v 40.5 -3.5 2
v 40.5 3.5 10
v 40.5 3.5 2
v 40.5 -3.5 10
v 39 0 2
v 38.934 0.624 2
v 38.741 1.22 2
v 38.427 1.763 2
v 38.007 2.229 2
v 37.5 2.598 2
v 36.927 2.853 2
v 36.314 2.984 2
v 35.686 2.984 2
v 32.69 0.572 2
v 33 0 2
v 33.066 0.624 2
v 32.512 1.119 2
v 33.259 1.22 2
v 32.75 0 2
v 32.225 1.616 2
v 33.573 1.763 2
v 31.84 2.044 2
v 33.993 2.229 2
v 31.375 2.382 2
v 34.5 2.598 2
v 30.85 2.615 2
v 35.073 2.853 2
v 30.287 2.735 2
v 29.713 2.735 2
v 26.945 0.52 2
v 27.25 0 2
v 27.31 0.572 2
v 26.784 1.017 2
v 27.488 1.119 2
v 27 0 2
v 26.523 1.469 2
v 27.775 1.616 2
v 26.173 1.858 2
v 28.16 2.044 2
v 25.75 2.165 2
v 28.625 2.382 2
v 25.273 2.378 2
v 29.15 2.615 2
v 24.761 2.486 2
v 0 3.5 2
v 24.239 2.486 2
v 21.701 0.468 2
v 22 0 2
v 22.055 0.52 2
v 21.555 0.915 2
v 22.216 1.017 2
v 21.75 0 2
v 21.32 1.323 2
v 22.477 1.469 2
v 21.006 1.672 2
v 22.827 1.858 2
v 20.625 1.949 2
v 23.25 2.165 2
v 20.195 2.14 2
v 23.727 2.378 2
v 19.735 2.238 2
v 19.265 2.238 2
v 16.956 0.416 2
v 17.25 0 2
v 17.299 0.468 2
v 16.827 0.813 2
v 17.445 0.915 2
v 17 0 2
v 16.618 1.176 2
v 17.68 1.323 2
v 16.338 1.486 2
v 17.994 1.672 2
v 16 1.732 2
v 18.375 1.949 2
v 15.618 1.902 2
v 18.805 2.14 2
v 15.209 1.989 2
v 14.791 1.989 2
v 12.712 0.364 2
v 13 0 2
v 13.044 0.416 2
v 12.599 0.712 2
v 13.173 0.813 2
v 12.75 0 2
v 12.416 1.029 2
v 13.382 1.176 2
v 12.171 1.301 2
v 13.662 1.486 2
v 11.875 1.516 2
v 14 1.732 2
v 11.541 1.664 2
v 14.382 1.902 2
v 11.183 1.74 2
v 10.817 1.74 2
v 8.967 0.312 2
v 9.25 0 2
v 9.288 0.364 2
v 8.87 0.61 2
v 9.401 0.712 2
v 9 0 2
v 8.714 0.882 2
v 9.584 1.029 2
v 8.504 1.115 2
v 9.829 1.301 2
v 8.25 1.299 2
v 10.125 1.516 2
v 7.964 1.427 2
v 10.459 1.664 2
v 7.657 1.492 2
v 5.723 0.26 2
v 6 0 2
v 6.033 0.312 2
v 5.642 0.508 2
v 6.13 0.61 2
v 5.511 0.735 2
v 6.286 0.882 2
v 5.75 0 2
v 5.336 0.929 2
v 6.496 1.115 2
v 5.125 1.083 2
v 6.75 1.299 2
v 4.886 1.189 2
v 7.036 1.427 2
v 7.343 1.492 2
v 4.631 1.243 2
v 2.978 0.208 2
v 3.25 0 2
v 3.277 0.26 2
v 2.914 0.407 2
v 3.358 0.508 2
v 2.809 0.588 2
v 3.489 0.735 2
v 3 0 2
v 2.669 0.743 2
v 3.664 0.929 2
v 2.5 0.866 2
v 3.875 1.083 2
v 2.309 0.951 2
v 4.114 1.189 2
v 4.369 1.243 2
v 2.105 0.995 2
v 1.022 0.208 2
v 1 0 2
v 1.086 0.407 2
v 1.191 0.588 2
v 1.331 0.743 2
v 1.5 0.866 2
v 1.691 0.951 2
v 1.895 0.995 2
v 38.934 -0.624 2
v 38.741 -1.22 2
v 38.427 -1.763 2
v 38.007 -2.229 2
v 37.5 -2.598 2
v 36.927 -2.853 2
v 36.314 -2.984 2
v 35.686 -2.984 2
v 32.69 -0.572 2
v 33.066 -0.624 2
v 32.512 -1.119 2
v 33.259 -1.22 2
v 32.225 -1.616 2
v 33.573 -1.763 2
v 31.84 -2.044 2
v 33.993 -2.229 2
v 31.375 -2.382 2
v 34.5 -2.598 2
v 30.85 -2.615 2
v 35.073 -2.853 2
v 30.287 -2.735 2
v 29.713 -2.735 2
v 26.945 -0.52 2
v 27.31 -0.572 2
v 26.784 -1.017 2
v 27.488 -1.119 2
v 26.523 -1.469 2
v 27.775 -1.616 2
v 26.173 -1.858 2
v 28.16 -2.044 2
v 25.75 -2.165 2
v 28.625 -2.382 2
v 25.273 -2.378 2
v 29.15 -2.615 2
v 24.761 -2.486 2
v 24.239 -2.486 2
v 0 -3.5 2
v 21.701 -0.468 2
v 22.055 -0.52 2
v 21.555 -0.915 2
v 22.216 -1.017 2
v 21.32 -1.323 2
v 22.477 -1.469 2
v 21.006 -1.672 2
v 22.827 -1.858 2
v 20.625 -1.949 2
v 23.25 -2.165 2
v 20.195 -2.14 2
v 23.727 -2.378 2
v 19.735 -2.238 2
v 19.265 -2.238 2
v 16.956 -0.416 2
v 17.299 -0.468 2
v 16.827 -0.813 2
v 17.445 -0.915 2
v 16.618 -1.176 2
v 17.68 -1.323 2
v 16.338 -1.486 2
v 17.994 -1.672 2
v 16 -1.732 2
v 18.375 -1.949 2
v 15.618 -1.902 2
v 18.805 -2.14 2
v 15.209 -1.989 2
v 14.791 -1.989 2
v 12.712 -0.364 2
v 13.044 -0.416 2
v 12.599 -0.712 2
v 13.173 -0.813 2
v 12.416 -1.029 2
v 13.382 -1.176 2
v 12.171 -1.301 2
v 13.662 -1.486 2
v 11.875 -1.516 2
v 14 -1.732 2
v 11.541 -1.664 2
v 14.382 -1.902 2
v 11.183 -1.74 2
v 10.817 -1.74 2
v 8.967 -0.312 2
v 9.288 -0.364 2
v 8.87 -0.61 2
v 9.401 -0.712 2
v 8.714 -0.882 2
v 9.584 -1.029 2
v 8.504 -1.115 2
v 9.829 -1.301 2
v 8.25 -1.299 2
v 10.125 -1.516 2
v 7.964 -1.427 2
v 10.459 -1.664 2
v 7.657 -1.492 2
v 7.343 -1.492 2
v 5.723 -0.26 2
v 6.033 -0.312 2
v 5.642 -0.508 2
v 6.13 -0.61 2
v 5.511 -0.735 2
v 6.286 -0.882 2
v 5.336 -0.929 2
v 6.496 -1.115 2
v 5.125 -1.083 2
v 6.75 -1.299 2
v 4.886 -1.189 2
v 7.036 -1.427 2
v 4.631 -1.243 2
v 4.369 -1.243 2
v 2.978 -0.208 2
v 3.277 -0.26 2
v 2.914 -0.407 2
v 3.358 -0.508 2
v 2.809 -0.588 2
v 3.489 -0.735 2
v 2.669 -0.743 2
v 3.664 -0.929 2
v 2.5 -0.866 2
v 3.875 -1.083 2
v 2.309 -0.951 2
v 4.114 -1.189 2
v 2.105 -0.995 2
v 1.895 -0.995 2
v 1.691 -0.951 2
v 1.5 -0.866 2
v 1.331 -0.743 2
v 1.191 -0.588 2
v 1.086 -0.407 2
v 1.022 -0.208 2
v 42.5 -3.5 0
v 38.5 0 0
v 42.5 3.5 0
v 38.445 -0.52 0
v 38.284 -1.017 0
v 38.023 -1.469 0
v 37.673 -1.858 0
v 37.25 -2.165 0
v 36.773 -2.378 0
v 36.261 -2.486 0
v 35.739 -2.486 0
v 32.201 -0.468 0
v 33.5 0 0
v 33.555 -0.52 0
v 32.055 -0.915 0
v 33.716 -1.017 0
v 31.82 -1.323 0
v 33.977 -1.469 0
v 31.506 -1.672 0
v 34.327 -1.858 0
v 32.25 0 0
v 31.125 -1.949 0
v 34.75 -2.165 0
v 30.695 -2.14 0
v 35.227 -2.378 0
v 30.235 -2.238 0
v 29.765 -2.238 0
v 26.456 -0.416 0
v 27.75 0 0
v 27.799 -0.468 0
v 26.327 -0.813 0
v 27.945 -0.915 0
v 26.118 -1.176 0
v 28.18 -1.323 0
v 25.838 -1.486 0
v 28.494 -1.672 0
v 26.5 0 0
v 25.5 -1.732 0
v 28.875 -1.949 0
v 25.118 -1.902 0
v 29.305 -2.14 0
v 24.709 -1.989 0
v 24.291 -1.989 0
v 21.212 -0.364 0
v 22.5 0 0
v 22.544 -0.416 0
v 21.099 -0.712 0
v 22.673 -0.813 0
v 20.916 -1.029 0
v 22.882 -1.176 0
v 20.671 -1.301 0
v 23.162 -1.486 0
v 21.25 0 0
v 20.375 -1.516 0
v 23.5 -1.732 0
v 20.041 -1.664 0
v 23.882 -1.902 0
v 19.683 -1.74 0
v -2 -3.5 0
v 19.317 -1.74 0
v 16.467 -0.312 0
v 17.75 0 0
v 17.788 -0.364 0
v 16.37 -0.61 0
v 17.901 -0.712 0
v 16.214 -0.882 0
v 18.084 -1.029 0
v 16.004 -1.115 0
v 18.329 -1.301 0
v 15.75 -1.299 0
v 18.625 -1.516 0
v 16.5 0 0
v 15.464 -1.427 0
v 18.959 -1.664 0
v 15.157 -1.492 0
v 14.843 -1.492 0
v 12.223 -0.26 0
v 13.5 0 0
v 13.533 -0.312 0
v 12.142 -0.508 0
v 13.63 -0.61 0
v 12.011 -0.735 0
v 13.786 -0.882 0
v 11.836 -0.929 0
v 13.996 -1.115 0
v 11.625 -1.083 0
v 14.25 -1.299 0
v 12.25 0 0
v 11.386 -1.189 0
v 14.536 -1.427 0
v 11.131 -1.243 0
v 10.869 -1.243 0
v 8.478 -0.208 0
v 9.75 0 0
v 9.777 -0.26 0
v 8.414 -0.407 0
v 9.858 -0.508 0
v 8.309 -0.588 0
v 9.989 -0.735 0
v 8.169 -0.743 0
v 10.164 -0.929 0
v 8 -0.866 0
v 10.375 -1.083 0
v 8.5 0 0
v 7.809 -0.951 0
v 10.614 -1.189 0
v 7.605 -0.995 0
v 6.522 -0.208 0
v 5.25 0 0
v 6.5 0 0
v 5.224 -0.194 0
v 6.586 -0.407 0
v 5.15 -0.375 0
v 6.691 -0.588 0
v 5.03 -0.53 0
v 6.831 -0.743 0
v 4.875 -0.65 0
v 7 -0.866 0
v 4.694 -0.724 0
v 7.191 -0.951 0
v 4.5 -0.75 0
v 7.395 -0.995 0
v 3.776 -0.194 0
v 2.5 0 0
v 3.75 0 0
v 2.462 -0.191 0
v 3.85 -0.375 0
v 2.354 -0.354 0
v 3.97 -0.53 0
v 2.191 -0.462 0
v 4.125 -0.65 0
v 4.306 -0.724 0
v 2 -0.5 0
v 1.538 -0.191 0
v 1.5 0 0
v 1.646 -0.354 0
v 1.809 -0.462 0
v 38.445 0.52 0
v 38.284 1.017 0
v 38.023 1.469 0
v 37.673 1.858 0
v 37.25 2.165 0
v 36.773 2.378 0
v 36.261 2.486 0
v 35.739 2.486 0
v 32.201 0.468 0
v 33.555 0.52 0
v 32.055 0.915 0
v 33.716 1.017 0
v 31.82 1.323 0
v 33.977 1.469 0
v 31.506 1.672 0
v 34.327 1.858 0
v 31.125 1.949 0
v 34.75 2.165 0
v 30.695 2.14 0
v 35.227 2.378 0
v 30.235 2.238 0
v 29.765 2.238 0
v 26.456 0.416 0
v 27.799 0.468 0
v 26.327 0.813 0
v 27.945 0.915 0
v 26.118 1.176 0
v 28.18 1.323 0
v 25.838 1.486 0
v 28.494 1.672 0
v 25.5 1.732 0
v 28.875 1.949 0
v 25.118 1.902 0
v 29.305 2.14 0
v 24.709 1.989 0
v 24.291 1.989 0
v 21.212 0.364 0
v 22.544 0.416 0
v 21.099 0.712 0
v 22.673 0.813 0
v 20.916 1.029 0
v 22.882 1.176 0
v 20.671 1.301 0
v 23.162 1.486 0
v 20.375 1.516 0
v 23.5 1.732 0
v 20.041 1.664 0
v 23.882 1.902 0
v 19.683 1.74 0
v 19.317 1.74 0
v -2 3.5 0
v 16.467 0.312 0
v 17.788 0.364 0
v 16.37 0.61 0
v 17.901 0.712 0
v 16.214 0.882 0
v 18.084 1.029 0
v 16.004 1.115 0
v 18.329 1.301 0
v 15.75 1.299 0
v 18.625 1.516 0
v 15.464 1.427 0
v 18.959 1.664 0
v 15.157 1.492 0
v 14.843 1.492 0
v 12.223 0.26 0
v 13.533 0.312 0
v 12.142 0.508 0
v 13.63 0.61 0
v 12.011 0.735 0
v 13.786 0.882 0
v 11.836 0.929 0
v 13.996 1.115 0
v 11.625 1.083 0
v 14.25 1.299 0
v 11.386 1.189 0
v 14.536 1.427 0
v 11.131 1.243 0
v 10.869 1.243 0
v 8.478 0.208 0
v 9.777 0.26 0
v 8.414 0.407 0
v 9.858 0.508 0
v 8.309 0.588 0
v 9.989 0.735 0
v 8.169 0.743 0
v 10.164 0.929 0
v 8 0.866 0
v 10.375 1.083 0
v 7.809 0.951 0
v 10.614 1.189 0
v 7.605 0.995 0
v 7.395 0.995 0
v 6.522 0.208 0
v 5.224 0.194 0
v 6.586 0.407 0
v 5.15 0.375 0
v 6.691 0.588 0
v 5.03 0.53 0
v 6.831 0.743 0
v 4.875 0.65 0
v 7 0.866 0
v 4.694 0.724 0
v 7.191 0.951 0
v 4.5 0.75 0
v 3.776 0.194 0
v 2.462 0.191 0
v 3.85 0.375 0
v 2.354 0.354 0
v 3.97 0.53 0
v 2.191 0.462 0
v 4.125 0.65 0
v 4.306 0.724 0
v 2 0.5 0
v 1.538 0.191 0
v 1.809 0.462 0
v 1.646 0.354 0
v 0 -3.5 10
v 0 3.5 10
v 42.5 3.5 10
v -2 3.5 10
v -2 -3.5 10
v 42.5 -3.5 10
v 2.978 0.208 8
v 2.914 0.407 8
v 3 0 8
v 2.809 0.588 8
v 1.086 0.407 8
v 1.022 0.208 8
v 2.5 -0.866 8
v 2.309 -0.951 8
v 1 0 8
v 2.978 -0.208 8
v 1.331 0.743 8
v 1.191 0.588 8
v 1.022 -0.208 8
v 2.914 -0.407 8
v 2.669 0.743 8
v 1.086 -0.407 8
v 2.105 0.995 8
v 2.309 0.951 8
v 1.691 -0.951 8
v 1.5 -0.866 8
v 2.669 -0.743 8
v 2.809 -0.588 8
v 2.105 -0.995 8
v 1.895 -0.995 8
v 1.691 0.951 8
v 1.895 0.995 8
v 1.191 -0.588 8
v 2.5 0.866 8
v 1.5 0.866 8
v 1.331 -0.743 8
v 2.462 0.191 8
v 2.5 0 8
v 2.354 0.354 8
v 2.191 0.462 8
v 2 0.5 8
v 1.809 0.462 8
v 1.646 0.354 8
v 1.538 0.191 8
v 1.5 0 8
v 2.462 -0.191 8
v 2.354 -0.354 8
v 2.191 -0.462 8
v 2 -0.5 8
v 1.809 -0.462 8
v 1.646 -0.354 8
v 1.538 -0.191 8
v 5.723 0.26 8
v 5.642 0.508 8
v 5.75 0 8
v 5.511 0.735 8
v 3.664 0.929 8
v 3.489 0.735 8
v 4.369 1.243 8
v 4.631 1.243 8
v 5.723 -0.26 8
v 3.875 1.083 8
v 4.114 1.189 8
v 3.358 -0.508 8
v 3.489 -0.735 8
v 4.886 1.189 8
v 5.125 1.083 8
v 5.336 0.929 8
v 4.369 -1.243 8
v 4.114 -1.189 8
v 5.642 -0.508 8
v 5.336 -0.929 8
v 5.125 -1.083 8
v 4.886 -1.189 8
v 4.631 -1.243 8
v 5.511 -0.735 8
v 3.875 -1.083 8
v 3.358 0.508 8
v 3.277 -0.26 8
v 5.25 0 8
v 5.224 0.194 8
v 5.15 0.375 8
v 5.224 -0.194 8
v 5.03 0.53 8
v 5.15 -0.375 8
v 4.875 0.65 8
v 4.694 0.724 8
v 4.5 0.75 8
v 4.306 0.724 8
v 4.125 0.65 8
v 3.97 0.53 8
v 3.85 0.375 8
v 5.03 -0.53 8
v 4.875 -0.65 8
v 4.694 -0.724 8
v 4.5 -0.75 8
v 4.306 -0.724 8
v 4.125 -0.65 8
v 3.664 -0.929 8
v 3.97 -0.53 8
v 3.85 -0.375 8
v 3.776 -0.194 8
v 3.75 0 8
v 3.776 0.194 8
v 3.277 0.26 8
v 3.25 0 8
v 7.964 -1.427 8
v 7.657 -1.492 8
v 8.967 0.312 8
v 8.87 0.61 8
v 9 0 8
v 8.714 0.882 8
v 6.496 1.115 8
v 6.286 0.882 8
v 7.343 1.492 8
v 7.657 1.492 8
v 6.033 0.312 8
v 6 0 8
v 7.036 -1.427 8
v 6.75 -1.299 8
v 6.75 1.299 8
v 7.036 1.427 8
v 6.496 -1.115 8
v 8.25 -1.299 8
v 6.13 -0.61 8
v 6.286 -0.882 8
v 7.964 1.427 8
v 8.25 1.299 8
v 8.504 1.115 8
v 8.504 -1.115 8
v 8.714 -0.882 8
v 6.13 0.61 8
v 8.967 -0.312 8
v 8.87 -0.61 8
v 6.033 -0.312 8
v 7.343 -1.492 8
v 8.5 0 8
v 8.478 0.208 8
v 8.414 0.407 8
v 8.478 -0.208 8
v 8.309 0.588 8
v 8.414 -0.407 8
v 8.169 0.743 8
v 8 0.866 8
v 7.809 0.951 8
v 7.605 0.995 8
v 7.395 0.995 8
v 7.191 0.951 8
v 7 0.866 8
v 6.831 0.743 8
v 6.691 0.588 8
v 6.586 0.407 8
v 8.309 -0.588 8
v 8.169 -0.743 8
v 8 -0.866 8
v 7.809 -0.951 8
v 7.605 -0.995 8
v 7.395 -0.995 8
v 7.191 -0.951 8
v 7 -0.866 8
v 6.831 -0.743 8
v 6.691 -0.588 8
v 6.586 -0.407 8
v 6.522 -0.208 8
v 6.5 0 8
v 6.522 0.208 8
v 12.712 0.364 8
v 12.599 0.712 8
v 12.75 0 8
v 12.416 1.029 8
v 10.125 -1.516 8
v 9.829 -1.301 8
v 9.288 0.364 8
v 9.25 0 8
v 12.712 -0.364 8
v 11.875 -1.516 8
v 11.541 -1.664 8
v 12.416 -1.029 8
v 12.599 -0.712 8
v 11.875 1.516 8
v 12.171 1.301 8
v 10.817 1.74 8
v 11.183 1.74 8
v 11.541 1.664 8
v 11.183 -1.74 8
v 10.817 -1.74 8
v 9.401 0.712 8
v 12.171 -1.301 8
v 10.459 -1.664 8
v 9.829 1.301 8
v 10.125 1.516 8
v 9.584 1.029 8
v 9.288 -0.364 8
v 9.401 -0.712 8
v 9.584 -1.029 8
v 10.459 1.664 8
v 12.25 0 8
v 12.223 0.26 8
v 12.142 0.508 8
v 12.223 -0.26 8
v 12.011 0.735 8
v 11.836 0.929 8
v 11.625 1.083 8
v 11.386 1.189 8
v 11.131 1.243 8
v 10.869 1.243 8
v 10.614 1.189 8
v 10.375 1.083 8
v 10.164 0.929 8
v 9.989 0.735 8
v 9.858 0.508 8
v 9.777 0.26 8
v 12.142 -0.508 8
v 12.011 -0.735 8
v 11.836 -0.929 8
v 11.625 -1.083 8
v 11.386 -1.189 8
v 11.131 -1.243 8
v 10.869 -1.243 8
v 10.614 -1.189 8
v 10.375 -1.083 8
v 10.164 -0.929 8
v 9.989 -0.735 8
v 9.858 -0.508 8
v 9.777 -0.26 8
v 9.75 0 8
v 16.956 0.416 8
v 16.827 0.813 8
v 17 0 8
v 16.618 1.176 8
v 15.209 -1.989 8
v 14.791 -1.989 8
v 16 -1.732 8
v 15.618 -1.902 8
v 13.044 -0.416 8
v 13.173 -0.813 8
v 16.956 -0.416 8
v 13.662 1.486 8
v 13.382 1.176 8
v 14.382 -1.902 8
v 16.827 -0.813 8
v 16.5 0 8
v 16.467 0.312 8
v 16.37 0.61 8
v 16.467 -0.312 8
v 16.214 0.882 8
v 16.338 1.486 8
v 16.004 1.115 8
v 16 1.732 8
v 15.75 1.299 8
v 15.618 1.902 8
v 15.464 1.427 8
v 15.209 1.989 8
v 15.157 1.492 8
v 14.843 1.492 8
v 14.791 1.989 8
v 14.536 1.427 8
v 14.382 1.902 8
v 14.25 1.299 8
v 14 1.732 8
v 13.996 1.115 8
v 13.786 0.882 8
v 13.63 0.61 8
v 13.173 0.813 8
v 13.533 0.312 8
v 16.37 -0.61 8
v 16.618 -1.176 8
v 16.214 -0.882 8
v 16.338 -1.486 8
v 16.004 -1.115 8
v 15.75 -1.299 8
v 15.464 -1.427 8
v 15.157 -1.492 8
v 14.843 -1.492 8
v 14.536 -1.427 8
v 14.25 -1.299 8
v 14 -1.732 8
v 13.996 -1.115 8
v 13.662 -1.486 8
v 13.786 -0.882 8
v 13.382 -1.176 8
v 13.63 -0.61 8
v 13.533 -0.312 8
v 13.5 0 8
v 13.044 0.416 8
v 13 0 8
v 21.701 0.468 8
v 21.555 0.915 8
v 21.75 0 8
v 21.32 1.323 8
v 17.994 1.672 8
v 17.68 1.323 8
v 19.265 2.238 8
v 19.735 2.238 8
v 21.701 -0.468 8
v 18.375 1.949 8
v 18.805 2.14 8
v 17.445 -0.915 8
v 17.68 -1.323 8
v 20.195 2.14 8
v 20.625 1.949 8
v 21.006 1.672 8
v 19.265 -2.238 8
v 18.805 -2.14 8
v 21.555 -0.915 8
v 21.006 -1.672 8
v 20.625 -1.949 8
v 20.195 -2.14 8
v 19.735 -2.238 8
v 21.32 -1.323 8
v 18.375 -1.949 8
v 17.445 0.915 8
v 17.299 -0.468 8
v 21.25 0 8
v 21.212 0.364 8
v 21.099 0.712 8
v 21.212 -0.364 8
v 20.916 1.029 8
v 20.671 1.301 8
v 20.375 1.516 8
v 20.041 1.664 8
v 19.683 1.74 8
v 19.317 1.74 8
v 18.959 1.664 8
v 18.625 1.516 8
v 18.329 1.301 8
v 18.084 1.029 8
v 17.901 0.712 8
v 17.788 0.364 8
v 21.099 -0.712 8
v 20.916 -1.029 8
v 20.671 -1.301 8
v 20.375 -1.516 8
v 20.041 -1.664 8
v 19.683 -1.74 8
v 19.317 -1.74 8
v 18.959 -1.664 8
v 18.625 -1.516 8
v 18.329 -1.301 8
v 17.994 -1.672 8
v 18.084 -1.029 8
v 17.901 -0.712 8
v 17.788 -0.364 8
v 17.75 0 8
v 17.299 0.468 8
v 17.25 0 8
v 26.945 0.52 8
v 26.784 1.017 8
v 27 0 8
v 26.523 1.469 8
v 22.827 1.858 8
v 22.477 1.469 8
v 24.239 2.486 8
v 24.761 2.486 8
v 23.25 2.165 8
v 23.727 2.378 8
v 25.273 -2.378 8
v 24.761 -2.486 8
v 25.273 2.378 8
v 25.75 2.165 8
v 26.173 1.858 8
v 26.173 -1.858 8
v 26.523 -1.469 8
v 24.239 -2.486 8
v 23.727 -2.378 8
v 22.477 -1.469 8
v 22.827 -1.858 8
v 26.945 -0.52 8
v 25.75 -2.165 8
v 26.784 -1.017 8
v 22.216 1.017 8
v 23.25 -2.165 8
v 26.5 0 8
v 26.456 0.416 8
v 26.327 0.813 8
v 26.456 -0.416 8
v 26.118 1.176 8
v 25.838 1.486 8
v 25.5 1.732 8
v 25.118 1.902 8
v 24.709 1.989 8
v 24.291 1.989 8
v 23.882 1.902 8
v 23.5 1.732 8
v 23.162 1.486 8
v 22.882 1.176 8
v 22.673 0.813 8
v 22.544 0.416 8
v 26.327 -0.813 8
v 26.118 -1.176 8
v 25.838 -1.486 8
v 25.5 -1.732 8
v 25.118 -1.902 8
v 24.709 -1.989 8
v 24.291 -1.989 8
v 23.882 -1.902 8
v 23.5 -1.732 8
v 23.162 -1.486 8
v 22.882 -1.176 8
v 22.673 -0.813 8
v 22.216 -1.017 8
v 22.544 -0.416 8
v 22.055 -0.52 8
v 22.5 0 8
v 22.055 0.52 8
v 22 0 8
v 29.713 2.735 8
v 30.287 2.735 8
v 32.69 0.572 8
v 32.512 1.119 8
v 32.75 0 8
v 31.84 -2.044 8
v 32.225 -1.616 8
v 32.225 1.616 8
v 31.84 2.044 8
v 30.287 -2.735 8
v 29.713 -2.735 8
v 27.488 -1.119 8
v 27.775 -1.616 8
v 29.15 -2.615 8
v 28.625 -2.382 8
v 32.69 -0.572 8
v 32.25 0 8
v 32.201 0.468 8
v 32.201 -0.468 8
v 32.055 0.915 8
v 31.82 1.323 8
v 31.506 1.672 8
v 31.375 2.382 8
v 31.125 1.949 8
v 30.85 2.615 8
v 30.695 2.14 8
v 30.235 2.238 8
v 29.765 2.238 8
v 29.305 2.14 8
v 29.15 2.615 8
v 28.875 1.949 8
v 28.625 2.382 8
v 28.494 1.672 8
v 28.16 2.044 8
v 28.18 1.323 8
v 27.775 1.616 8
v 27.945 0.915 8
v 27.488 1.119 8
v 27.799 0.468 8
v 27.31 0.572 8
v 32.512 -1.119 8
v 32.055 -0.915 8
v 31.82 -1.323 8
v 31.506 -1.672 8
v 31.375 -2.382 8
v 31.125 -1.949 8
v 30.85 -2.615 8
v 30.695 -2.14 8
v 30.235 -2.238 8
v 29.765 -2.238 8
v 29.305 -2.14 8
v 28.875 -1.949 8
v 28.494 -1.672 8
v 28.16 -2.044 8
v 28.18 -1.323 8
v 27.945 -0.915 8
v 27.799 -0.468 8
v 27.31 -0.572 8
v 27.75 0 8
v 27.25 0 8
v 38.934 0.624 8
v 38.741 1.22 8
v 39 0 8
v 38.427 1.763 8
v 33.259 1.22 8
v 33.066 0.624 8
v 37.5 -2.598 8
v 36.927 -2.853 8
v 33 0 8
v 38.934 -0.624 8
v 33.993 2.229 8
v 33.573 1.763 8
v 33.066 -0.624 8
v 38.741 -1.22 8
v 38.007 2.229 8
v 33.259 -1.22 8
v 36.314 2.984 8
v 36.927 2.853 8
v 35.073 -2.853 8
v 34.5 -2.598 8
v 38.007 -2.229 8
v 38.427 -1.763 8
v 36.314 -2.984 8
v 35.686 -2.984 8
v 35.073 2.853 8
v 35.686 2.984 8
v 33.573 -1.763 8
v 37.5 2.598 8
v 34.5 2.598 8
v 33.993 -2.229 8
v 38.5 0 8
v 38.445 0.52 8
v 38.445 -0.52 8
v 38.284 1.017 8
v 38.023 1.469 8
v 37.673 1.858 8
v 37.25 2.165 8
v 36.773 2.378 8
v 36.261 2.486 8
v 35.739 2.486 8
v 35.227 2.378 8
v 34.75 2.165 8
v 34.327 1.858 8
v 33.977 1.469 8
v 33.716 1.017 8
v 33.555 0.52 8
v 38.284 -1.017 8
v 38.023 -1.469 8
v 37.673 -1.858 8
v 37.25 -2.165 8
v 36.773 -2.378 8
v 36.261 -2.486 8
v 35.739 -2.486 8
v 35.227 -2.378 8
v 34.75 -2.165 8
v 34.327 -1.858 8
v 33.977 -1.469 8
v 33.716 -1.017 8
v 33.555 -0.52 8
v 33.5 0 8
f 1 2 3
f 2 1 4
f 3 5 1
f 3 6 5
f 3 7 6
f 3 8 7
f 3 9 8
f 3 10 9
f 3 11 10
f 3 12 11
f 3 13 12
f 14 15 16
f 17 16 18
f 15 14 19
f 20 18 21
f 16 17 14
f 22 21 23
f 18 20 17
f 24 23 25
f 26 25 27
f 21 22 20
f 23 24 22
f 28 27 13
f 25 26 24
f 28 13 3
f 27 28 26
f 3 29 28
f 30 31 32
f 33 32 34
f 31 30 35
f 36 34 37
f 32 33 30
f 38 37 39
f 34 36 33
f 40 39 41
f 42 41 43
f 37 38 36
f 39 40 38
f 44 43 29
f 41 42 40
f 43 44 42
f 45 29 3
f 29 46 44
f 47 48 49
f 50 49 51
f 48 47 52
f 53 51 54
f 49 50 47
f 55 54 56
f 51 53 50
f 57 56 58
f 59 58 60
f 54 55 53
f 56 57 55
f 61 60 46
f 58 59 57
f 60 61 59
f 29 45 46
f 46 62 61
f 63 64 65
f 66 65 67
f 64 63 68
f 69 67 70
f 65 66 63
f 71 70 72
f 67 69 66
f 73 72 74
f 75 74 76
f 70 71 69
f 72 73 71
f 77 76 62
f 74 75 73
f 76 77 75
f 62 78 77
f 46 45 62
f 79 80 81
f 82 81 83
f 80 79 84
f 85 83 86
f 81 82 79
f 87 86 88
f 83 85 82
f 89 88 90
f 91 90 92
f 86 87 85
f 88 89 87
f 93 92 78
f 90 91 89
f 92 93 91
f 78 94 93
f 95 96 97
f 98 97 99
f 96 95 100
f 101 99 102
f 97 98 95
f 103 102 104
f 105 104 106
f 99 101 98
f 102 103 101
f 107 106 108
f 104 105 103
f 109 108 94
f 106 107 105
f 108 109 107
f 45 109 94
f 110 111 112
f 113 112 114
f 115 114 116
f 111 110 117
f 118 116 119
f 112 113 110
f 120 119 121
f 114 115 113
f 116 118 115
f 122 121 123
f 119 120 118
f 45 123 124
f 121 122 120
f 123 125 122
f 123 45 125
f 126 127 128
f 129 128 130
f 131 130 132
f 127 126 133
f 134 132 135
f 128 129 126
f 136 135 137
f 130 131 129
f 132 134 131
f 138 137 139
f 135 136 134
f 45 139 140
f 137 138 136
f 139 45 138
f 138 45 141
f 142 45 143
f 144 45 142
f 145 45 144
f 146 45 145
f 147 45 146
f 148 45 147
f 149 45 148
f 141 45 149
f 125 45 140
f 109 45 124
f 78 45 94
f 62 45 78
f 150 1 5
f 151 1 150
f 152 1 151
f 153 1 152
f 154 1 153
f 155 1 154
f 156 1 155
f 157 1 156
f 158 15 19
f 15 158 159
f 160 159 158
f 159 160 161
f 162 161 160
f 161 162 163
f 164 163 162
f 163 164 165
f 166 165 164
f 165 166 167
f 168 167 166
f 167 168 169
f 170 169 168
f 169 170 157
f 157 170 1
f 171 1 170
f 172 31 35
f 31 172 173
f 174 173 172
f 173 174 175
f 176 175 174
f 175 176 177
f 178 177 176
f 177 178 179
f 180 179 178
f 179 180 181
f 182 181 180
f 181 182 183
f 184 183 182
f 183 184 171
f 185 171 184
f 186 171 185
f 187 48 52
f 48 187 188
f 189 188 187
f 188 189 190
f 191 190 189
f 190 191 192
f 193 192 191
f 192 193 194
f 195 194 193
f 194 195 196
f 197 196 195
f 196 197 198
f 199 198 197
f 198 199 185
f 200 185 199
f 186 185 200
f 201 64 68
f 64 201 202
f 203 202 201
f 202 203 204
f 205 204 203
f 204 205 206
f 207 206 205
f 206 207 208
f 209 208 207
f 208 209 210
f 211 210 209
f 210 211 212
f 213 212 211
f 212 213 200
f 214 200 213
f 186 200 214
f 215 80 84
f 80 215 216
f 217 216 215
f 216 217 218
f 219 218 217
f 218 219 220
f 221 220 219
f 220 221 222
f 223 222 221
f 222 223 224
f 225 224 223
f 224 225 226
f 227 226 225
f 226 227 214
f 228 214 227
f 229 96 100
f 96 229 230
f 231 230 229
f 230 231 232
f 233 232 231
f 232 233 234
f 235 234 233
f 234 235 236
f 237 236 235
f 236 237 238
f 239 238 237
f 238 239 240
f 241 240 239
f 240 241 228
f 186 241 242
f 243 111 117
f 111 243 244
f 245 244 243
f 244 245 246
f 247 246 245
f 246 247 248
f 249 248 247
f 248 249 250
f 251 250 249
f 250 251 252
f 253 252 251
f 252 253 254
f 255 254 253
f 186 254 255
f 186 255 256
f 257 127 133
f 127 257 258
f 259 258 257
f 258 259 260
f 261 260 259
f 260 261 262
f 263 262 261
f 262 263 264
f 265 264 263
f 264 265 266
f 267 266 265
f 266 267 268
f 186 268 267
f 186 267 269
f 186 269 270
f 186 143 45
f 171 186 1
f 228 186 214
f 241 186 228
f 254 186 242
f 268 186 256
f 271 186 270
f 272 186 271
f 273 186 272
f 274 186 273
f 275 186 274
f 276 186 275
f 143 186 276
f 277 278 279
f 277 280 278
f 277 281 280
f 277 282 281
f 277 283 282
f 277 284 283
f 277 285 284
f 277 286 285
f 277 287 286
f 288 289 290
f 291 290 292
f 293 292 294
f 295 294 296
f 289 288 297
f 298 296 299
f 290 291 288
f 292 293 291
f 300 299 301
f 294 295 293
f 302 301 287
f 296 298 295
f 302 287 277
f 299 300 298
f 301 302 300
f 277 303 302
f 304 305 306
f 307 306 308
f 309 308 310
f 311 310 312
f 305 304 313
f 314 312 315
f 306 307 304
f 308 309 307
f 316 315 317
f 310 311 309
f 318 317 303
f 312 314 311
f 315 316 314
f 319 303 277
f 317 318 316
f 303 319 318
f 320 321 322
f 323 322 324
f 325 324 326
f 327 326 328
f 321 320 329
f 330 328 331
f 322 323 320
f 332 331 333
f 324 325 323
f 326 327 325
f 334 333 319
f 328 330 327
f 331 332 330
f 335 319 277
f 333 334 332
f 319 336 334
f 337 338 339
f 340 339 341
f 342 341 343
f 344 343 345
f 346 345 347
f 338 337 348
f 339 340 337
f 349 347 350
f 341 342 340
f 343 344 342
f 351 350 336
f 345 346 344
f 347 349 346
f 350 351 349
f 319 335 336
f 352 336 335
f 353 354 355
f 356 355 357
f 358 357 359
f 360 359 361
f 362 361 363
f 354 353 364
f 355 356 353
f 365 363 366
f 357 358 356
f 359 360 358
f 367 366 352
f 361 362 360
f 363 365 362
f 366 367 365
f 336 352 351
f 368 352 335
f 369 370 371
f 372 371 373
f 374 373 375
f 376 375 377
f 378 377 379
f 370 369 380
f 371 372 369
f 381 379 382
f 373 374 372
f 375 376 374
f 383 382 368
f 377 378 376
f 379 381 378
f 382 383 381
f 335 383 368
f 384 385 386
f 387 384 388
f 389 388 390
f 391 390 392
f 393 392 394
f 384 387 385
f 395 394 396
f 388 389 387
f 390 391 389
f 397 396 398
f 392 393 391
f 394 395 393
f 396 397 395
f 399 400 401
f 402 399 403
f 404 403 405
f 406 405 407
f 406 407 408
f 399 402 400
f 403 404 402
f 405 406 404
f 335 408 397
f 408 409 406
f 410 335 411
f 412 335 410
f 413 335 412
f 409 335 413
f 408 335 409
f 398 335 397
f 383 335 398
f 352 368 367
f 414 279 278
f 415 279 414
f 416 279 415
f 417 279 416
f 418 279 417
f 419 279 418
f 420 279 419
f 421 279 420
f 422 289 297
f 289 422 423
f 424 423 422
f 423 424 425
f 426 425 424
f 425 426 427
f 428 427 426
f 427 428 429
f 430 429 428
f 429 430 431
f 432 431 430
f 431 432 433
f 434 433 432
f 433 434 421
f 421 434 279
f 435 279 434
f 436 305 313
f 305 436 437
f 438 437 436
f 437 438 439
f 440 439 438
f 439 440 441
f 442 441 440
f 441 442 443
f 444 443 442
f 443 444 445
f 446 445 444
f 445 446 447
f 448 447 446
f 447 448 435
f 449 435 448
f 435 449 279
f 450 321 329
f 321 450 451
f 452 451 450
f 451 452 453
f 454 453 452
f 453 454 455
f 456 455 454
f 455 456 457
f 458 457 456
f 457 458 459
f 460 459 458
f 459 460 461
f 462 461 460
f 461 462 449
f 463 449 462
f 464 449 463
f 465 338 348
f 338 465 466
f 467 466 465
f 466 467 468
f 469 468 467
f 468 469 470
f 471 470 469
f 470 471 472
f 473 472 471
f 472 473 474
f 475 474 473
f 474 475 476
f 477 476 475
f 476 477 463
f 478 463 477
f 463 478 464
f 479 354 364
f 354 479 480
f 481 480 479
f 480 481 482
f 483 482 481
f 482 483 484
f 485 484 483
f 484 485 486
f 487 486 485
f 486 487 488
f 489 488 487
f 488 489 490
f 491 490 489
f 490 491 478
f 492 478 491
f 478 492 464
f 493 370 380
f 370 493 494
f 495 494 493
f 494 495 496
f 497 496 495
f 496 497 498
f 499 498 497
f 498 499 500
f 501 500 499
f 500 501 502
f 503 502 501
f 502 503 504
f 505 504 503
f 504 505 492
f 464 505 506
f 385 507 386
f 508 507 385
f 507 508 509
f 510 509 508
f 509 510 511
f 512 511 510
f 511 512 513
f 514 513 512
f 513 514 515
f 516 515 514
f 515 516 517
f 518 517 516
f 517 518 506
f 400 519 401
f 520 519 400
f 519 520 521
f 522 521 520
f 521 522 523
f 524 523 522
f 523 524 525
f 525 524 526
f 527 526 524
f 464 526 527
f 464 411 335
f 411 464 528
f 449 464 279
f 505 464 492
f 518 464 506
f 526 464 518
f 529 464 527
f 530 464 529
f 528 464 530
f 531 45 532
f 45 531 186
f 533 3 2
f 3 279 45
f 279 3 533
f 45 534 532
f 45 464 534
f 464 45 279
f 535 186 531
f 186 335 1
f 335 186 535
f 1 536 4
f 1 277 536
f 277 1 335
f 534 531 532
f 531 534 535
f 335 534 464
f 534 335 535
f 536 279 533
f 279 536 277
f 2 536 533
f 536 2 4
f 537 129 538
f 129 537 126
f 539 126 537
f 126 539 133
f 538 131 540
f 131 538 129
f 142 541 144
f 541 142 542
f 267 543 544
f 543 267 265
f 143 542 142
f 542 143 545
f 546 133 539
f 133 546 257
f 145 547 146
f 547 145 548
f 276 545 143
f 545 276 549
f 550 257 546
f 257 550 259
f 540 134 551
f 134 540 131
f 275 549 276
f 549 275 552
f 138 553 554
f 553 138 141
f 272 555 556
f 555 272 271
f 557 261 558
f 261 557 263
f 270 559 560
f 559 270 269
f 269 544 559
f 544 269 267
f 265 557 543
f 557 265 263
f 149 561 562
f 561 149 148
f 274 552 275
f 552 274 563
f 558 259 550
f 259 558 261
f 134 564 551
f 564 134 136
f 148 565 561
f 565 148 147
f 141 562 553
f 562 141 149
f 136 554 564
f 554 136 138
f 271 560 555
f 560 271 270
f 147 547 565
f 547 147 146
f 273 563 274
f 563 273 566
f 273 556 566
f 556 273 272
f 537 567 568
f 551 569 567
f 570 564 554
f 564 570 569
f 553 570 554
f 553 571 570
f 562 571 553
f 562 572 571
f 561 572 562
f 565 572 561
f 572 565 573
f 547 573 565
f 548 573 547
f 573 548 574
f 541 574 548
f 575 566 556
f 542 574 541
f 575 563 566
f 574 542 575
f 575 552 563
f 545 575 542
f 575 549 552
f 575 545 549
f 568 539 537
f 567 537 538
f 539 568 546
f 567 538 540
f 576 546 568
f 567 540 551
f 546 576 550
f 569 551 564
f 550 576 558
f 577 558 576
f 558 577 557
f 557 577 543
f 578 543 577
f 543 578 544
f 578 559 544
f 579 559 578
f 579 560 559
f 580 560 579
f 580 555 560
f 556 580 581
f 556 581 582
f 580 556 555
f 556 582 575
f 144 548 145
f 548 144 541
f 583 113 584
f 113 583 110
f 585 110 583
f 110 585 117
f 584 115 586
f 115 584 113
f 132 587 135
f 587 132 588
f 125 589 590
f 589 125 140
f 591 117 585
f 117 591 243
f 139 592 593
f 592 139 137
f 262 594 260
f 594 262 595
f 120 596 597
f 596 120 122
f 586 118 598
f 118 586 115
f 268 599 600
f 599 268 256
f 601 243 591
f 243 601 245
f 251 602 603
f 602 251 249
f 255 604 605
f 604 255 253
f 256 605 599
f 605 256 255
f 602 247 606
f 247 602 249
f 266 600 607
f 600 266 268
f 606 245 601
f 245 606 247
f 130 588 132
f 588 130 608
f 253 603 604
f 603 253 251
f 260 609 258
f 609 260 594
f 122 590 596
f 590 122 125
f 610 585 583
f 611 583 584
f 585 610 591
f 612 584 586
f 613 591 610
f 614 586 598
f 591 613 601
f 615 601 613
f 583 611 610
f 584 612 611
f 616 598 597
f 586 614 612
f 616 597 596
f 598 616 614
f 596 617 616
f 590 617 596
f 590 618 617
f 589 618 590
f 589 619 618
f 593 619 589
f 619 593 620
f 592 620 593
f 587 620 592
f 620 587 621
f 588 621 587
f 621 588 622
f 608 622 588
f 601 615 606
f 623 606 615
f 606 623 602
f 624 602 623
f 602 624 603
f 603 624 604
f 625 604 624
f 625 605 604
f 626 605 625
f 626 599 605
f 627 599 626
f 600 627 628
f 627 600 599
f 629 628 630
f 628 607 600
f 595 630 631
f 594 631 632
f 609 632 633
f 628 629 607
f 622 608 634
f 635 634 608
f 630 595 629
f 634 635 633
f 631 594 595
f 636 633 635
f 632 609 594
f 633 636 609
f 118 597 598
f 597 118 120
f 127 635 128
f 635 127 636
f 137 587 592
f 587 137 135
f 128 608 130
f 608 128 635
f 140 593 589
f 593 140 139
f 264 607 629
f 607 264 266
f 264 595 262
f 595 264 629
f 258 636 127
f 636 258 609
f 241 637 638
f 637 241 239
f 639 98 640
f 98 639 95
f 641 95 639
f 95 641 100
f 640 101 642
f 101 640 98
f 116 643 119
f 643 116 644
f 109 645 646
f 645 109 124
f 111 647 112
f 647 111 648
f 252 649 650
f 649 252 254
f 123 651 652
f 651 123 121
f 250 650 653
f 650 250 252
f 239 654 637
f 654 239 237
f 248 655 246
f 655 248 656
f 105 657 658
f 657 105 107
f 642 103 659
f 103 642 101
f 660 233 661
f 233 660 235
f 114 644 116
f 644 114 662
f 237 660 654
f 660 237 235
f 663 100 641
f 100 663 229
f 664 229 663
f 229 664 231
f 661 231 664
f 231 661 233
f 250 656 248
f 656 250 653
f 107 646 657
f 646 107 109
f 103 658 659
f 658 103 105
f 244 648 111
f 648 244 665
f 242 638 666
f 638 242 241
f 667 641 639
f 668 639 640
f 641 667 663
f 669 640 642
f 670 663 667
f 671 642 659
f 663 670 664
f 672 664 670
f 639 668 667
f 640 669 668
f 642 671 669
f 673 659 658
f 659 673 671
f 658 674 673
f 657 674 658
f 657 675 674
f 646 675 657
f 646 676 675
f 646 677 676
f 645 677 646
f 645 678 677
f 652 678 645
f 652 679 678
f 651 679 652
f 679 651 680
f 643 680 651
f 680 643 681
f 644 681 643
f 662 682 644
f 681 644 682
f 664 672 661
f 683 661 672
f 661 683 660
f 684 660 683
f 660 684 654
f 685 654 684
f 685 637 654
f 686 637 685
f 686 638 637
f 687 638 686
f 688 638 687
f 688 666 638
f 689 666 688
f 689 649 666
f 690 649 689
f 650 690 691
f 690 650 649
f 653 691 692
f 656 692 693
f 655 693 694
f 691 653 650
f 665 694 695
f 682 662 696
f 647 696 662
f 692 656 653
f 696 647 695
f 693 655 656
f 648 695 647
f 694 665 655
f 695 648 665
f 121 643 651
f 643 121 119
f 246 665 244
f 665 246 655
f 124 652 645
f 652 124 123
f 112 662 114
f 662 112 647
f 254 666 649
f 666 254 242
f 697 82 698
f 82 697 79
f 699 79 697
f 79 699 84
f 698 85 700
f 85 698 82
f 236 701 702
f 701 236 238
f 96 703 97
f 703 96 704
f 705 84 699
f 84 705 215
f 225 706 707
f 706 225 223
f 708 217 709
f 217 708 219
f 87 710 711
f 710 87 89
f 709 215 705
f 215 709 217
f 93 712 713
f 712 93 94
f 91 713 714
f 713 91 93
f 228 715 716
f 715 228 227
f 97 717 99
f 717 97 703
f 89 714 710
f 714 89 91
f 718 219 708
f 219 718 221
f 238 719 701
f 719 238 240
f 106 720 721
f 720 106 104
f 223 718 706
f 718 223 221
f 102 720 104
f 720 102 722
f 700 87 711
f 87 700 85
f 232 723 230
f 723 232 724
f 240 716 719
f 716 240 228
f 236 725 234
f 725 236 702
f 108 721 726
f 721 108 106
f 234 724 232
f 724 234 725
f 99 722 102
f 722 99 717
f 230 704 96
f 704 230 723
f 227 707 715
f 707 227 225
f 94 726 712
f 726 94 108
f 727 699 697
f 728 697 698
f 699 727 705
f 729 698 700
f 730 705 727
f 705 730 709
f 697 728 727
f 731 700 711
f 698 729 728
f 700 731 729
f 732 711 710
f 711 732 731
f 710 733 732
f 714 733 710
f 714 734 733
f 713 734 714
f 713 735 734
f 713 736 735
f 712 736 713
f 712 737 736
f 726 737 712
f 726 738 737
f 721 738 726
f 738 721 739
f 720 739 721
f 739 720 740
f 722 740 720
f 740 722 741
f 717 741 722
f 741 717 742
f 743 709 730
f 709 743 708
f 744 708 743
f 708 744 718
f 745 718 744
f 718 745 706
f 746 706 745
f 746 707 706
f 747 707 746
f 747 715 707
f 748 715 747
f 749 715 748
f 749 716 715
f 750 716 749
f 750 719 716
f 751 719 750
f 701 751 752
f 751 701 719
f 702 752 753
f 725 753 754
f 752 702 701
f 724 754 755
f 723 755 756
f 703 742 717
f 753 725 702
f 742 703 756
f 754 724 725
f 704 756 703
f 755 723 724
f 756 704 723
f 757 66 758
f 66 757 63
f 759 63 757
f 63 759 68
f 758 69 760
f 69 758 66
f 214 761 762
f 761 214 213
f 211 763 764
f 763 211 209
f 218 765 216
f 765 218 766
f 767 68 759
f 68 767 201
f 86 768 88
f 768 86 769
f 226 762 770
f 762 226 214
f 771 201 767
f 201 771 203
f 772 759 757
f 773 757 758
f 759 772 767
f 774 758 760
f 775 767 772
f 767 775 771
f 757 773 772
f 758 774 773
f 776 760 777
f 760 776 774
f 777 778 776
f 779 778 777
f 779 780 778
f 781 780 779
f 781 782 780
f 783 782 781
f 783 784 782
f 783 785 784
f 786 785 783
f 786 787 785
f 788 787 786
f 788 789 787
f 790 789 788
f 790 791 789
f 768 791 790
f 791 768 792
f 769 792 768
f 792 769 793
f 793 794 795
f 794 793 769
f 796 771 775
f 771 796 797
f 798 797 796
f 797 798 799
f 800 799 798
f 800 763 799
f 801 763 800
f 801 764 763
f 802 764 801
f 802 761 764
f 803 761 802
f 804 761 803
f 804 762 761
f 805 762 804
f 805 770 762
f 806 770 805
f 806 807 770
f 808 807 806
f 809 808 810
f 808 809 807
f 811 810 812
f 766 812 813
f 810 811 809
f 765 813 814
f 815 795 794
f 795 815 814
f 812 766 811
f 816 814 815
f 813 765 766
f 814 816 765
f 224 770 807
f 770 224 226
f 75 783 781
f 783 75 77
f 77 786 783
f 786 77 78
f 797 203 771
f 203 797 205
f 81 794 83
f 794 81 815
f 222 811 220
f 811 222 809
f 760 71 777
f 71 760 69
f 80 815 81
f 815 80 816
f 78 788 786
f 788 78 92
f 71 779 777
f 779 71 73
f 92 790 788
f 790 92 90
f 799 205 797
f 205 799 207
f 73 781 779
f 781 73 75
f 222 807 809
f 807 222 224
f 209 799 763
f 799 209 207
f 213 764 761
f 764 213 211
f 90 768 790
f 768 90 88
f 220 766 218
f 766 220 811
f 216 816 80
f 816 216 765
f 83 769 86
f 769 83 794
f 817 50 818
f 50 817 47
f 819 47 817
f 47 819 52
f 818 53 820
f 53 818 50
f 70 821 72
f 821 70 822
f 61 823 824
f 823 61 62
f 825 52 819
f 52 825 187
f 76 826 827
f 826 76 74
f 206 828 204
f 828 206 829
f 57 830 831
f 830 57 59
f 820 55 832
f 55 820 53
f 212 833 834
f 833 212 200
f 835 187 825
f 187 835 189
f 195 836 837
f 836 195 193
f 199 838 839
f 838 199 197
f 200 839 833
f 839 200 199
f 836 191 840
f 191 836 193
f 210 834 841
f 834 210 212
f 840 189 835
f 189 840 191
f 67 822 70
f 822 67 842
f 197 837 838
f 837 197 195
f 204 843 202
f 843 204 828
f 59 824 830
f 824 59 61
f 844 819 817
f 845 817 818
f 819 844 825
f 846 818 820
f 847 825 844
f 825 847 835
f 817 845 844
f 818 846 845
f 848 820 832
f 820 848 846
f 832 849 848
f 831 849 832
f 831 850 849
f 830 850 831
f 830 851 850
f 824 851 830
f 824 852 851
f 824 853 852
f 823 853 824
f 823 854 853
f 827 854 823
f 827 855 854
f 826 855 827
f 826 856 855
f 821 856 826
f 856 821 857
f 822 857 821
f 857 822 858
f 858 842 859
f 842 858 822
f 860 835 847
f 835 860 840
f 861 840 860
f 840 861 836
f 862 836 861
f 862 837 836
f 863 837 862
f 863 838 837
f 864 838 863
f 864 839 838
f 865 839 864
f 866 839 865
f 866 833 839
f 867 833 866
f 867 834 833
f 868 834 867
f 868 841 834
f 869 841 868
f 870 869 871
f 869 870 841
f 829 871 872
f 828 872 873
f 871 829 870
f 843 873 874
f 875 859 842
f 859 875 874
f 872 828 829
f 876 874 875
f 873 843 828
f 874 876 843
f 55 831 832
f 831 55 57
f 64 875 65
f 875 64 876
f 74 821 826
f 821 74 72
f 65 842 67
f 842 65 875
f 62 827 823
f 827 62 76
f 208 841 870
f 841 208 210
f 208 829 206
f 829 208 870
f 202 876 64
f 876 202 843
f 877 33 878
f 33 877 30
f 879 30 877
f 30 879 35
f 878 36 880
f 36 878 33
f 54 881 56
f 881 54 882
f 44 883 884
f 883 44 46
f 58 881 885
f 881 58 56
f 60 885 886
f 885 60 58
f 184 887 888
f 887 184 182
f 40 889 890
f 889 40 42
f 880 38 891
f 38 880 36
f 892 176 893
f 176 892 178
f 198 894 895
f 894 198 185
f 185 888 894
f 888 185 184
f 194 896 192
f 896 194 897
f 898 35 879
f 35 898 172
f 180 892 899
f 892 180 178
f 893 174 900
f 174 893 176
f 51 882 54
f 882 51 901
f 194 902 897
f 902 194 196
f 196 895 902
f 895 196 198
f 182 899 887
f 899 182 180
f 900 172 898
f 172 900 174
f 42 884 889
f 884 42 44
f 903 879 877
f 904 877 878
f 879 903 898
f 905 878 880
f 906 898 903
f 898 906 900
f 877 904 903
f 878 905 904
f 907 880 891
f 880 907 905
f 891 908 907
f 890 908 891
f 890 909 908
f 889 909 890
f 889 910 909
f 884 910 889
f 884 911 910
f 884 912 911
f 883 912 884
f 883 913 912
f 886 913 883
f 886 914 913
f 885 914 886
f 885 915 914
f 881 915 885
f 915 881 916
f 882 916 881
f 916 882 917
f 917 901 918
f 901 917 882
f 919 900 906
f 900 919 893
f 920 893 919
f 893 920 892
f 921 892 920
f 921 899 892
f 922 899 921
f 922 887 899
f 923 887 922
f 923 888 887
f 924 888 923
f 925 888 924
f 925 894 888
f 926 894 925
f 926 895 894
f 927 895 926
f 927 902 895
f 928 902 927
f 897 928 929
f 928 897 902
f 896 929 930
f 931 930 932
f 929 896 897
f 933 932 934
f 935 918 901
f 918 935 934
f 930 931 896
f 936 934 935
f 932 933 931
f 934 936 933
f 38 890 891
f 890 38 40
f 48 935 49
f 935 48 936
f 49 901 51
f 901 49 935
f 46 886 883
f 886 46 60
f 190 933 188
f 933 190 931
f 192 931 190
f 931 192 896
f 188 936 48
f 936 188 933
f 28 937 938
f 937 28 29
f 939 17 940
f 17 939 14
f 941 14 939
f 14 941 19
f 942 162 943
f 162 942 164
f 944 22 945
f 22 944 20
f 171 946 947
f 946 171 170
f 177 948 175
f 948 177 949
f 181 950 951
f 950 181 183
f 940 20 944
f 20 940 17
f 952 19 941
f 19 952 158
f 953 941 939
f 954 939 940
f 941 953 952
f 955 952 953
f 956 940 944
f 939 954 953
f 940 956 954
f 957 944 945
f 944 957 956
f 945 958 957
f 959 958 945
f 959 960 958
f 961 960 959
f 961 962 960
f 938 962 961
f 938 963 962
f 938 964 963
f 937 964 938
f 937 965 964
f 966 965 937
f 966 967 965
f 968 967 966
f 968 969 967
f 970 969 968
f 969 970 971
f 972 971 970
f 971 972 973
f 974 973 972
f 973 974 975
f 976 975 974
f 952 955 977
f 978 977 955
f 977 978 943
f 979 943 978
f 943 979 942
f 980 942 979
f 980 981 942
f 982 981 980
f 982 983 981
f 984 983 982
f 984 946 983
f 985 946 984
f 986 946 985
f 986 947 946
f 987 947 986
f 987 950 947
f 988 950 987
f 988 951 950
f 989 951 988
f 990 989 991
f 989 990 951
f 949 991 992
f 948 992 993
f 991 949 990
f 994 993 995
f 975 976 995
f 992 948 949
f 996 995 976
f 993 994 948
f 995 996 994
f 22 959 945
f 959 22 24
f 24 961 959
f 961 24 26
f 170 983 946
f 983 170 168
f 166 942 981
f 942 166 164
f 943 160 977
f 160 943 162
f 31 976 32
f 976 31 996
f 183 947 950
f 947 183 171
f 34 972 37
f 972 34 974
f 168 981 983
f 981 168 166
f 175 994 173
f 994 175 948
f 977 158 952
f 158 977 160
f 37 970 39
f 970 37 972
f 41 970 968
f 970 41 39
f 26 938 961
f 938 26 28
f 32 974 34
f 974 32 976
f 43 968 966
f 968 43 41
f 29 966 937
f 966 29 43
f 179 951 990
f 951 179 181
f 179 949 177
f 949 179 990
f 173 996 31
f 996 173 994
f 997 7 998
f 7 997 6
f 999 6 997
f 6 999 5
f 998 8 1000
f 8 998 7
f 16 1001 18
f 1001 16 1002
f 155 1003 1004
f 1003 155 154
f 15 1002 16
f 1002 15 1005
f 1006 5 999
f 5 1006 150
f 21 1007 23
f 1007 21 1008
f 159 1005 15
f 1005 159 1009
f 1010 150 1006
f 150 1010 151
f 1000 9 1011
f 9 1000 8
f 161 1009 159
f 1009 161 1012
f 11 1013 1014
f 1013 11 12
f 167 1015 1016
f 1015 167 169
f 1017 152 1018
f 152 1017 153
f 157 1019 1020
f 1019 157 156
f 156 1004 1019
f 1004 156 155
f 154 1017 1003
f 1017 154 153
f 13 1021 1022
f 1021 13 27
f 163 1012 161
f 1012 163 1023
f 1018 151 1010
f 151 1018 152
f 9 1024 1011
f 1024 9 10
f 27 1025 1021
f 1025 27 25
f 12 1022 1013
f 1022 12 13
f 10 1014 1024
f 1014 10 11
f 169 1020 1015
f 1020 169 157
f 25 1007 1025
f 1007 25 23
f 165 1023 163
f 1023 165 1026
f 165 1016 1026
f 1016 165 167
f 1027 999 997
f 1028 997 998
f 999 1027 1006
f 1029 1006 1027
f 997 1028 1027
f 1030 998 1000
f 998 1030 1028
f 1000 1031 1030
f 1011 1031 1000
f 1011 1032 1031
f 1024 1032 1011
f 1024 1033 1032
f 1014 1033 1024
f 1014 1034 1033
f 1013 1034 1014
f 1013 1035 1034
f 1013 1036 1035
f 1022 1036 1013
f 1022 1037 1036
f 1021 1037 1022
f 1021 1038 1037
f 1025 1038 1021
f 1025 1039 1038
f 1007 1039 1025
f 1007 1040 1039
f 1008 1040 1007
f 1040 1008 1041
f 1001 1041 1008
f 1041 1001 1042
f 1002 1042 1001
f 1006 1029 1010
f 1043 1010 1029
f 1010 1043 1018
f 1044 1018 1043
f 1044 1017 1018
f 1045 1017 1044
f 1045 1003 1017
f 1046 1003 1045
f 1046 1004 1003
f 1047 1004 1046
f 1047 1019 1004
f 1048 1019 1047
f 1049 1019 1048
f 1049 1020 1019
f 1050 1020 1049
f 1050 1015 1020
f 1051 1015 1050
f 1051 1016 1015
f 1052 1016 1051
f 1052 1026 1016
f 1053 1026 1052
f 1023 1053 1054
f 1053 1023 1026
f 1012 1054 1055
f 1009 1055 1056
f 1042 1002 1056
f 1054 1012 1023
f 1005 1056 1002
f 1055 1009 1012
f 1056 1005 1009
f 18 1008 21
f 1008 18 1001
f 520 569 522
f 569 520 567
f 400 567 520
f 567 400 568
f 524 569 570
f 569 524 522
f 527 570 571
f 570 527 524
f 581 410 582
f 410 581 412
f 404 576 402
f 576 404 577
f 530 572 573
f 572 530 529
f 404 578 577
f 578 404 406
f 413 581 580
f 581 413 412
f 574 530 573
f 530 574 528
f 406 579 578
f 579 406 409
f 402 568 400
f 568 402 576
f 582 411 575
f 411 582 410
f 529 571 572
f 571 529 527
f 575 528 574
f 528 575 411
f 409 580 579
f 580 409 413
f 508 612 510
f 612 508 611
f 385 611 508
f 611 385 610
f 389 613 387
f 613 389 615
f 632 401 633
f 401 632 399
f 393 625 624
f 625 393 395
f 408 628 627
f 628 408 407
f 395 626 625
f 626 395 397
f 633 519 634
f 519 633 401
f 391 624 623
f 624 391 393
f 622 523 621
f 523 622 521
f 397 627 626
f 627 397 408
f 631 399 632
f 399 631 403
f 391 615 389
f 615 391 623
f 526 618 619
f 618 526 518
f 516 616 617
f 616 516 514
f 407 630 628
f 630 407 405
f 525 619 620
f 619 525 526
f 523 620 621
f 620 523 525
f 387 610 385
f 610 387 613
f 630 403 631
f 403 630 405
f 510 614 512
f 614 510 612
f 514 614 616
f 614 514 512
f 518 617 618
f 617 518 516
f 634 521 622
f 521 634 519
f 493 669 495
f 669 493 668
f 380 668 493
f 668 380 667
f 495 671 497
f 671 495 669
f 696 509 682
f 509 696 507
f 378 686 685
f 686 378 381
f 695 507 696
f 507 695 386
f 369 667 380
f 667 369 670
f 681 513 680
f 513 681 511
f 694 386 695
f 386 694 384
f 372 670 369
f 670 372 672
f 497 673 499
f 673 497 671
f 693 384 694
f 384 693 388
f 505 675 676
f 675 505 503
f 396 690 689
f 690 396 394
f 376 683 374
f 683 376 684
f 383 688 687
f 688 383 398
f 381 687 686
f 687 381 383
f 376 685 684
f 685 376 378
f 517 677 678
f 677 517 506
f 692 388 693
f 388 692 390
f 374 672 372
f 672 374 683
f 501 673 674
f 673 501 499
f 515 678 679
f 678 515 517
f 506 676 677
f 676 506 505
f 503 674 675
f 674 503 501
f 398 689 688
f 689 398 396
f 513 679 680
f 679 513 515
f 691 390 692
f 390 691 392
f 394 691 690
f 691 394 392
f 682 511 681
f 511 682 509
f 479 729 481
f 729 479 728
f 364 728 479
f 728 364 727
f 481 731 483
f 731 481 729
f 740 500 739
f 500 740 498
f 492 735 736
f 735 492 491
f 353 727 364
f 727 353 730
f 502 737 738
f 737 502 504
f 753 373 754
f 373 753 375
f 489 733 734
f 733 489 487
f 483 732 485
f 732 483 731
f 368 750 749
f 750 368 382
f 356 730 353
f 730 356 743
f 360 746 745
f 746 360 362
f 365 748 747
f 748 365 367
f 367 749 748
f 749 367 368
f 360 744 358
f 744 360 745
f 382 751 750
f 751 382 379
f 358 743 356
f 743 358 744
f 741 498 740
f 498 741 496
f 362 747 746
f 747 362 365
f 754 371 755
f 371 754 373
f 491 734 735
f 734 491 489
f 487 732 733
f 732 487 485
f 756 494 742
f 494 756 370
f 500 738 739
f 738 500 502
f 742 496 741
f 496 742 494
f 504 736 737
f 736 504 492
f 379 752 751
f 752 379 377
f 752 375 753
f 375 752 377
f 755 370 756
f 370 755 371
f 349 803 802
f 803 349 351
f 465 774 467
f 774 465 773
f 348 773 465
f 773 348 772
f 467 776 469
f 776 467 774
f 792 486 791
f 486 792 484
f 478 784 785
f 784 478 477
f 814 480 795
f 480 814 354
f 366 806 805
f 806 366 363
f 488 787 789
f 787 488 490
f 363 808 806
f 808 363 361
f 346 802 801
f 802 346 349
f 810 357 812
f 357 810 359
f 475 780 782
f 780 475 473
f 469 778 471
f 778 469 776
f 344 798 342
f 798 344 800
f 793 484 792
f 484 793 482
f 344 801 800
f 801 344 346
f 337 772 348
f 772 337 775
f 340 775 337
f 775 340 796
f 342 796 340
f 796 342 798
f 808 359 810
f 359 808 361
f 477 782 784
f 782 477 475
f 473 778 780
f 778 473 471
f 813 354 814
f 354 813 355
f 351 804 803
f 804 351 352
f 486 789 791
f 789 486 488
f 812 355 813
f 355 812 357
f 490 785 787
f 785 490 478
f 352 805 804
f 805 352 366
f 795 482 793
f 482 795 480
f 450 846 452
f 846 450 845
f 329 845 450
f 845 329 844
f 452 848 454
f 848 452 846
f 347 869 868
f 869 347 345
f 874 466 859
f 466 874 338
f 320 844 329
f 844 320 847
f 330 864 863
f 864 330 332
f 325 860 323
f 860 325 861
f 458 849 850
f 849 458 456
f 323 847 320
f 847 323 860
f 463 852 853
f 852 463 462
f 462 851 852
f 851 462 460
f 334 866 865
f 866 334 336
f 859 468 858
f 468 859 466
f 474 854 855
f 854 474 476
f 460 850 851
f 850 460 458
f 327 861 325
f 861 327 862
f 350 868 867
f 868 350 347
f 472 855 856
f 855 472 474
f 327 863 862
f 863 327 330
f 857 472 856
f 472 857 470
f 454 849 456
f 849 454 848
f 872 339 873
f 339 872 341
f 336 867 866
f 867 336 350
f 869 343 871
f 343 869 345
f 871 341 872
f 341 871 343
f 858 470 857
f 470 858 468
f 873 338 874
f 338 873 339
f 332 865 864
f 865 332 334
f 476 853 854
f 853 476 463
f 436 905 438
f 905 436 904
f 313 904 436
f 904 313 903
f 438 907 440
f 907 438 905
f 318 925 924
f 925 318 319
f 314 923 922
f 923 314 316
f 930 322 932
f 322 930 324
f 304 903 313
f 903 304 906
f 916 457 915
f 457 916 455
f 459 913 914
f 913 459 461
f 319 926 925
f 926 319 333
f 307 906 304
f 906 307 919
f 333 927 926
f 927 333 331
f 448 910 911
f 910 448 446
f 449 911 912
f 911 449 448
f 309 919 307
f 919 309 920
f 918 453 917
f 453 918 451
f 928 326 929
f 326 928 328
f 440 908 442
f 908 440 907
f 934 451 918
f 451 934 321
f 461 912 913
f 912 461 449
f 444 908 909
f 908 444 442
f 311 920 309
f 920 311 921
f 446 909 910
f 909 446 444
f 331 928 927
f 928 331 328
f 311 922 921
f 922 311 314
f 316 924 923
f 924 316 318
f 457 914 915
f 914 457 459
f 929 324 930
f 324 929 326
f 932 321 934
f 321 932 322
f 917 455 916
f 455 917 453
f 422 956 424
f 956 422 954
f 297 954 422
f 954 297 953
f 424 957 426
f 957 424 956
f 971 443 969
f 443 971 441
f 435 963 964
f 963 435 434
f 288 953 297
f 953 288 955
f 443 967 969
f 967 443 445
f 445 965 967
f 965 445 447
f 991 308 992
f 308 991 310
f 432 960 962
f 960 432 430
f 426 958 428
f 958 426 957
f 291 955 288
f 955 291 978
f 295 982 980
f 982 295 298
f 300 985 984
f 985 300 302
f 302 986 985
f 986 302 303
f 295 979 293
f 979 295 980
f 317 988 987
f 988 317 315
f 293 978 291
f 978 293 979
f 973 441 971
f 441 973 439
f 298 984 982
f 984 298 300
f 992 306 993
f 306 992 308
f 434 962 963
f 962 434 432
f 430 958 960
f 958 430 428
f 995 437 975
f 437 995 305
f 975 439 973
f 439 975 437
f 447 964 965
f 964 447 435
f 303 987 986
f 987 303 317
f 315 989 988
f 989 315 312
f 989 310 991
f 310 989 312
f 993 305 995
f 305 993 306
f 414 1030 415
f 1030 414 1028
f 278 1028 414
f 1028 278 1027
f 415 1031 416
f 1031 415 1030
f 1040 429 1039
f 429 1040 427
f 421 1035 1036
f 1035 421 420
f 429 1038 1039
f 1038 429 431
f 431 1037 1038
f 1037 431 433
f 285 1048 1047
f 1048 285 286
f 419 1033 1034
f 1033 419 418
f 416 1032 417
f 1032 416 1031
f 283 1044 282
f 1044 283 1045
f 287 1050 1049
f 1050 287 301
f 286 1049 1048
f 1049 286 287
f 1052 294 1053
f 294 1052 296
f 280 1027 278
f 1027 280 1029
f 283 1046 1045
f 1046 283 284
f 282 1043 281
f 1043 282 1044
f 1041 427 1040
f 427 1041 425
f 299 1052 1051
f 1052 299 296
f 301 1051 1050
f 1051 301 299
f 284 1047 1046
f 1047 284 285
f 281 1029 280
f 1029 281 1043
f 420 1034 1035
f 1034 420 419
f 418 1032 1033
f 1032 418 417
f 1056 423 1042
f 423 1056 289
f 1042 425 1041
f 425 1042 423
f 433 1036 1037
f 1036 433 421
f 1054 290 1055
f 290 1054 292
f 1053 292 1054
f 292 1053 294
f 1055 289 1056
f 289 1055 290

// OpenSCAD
// Capillary Action Test
// Adrian McCarthy 2022-05-30

module capillaries(ids=[1:10], h=10, wall_th=1) {

    first = ids[0];
    step = ids[1];
    last = ids[2];

    function od(i, range=ids) = i + wall_th;

    function pos(i, range=ids) =
        let (
            first = range[0],
            step  = range[1]
        )
            i < first ? 0 : pos(i-step) + od(i);

    width = pos(last+ step) - od(last)/2 + wall_th;
    depth = od(last) + wall_th;

    for (i = ids) echo(od(i), pos(i));

    difference() {
        union() {
            translate([0, -depth/2, 0]) {
                cube([width, depth, 2*wall_th]);
                translate([-2*wall_th, 0, 0])
                    cube([2*wall_th, depth, h+2*wall_th]);
                translate([width, 0, 0])
                    cube([2*wall_th, depth, h+2*wall_th]);
            }
            for (i = ids)
                translate([pos(i), 0, 0])
                    cylinder(h=h, d=od(i), $fs=0.2);
        }
        for (i = ids)
            translate([pos(i), 0, -1]) cylinder(h=10+2, d=i, $fs=0.2);
    }
}

capillaries([1:0.5:5], h=8);
